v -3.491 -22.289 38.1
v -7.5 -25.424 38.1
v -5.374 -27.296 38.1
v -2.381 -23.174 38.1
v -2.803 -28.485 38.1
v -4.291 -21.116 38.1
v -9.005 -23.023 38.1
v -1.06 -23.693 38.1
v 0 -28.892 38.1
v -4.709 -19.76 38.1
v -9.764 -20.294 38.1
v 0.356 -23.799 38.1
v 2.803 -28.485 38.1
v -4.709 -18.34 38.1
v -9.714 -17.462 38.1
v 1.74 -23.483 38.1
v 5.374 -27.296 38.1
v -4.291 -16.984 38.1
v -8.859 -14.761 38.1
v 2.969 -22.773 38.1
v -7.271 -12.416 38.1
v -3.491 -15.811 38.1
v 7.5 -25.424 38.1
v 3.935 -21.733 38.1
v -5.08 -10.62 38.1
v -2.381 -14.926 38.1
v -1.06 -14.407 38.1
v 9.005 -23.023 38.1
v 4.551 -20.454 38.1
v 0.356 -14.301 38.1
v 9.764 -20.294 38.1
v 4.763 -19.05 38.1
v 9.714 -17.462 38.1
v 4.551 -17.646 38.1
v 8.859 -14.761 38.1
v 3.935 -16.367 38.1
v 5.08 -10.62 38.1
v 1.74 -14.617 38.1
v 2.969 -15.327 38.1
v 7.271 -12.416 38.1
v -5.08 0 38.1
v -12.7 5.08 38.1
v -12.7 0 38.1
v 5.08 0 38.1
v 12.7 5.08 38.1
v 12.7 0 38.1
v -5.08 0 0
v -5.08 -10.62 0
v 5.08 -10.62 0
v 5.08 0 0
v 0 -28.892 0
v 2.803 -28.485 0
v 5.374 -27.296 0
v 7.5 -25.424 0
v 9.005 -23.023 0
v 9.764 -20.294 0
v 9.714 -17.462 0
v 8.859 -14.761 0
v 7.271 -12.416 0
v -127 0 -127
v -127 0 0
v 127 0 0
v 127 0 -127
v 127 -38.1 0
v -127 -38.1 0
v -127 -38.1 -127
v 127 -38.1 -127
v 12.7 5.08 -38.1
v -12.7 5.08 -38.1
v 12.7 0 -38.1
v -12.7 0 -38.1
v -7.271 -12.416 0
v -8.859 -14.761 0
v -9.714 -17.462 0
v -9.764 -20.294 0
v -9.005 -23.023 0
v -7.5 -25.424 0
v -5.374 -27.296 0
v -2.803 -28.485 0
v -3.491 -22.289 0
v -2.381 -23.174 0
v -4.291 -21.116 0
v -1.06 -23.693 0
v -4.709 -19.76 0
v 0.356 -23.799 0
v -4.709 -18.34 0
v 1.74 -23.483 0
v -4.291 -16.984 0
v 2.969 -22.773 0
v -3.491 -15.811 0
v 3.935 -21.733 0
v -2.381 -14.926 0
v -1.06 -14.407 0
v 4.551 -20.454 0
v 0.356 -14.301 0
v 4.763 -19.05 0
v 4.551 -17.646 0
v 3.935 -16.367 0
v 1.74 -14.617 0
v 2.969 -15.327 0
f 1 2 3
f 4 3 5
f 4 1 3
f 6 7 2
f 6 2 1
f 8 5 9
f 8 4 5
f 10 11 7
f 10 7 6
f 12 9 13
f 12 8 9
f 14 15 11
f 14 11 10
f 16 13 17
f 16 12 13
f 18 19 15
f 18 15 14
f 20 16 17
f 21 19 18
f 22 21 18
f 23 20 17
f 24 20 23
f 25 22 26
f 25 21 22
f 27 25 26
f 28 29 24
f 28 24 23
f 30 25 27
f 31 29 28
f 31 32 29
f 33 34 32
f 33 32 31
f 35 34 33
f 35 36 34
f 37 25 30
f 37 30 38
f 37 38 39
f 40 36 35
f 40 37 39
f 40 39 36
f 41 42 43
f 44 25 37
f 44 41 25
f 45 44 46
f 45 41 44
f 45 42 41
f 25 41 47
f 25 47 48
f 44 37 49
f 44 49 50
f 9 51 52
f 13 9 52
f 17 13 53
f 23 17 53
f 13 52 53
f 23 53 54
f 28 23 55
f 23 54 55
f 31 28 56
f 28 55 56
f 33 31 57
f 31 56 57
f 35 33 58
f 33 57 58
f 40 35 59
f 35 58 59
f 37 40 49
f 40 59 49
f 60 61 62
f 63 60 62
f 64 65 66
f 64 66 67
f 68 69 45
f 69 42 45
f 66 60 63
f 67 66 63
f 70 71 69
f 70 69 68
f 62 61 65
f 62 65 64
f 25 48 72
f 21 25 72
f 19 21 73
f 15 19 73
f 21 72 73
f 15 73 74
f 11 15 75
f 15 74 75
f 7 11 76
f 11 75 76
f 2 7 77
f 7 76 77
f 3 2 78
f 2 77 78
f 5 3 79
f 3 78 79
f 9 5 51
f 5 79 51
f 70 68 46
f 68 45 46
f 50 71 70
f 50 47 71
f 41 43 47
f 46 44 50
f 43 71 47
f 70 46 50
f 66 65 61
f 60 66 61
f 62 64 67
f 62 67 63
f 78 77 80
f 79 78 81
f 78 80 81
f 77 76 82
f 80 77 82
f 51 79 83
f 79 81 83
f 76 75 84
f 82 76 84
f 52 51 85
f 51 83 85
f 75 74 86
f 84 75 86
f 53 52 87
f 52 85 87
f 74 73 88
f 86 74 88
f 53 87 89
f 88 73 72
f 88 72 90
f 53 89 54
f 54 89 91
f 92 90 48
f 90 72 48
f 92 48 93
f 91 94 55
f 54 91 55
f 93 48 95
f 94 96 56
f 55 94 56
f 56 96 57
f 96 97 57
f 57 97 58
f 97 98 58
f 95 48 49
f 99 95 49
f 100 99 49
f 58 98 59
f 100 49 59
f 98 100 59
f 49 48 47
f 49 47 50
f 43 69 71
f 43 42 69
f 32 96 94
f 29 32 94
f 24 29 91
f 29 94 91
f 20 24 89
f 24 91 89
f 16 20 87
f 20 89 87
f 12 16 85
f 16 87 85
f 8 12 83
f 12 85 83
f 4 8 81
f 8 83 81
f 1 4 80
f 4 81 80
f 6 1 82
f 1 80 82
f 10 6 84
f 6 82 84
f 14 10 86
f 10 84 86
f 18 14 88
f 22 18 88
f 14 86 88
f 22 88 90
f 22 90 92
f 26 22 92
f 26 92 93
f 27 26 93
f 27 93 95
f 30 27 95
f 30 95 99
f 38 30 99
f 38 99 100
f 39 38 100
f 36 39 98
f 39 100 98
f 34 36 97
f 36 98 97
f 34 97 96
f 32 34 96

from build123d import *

# Parameters (mm, degrees)
F0_W     = 254
F0_H     = 38.1
F1_DEPTH = 127
F3_DEPTH = 38.1
F4_W     = 25.4
F4_H     = 5.08
F5_DEPTH = 38.1


with BuildPart() as f1:
    # F0 (on Top) → F1 (new body)
    with BuildSketch(Plane.XY):
        with Locations((0, -19.05)):
            Rectangle(F0_W, F0_H)
    extrude(amount=-F1_DEPTH)


with BuildPart() as f3:
    # F2 (on Top) → F3 (new body)
    with BuildSketch(Plane.XY):
        with BuildLine():
            ThreePointArc((-5.08, -10.6197920399), (-9.4828563233, -21.686331201), (0, -28.8925))
            ThreePointArc((0, -28.8925), (9.4828563233, -21.686331201), (5.08, -10.6197920399))
            Line((5.08, -10.6197920399), (5.08, 0))
            Line((5.08, 0), (12.7, 0))
            Line((12.7, 0), (12.7, 5.08))
            Line((12.7, 5.08), (-12.7, 5.08))
            Line((-12.7, 5.08), (-12.7, 0))
            Line((-12.7, 0), (-5.08, 0))
            Line((-5.08, 0), (-5.08, -10.6197920399))
        make_face()
        with BuildLine():
            ThreePointArc((0, -14.2875), (3.3675960454, -15.6824039546), (4.7625, -19.05))
            ThreePointArc((4.7625, -19.05), (3.3675960454, -22.4175960454), (0, -23.8125))
            ThreePointArc((0, -23.8125), (-4.7625, -19.05), (0, -14.2875))
        make_face(mode=Mode.SUBTRACT)
    extrude(amount=F3_DEPTH)

    # F4 (on face) → F5 (join)
    with BuildSketch(Plane(origin=(0, 0, 0), x_dir=(1, 0, 0), z_dir=(0, 0, -1))):
        with Locations((0, -2.54)):
            Rectangle(F4_W, F4_H)
    extrude(amount=F5_DEPTH)


solid = Compound([f1.part, f3.part])
